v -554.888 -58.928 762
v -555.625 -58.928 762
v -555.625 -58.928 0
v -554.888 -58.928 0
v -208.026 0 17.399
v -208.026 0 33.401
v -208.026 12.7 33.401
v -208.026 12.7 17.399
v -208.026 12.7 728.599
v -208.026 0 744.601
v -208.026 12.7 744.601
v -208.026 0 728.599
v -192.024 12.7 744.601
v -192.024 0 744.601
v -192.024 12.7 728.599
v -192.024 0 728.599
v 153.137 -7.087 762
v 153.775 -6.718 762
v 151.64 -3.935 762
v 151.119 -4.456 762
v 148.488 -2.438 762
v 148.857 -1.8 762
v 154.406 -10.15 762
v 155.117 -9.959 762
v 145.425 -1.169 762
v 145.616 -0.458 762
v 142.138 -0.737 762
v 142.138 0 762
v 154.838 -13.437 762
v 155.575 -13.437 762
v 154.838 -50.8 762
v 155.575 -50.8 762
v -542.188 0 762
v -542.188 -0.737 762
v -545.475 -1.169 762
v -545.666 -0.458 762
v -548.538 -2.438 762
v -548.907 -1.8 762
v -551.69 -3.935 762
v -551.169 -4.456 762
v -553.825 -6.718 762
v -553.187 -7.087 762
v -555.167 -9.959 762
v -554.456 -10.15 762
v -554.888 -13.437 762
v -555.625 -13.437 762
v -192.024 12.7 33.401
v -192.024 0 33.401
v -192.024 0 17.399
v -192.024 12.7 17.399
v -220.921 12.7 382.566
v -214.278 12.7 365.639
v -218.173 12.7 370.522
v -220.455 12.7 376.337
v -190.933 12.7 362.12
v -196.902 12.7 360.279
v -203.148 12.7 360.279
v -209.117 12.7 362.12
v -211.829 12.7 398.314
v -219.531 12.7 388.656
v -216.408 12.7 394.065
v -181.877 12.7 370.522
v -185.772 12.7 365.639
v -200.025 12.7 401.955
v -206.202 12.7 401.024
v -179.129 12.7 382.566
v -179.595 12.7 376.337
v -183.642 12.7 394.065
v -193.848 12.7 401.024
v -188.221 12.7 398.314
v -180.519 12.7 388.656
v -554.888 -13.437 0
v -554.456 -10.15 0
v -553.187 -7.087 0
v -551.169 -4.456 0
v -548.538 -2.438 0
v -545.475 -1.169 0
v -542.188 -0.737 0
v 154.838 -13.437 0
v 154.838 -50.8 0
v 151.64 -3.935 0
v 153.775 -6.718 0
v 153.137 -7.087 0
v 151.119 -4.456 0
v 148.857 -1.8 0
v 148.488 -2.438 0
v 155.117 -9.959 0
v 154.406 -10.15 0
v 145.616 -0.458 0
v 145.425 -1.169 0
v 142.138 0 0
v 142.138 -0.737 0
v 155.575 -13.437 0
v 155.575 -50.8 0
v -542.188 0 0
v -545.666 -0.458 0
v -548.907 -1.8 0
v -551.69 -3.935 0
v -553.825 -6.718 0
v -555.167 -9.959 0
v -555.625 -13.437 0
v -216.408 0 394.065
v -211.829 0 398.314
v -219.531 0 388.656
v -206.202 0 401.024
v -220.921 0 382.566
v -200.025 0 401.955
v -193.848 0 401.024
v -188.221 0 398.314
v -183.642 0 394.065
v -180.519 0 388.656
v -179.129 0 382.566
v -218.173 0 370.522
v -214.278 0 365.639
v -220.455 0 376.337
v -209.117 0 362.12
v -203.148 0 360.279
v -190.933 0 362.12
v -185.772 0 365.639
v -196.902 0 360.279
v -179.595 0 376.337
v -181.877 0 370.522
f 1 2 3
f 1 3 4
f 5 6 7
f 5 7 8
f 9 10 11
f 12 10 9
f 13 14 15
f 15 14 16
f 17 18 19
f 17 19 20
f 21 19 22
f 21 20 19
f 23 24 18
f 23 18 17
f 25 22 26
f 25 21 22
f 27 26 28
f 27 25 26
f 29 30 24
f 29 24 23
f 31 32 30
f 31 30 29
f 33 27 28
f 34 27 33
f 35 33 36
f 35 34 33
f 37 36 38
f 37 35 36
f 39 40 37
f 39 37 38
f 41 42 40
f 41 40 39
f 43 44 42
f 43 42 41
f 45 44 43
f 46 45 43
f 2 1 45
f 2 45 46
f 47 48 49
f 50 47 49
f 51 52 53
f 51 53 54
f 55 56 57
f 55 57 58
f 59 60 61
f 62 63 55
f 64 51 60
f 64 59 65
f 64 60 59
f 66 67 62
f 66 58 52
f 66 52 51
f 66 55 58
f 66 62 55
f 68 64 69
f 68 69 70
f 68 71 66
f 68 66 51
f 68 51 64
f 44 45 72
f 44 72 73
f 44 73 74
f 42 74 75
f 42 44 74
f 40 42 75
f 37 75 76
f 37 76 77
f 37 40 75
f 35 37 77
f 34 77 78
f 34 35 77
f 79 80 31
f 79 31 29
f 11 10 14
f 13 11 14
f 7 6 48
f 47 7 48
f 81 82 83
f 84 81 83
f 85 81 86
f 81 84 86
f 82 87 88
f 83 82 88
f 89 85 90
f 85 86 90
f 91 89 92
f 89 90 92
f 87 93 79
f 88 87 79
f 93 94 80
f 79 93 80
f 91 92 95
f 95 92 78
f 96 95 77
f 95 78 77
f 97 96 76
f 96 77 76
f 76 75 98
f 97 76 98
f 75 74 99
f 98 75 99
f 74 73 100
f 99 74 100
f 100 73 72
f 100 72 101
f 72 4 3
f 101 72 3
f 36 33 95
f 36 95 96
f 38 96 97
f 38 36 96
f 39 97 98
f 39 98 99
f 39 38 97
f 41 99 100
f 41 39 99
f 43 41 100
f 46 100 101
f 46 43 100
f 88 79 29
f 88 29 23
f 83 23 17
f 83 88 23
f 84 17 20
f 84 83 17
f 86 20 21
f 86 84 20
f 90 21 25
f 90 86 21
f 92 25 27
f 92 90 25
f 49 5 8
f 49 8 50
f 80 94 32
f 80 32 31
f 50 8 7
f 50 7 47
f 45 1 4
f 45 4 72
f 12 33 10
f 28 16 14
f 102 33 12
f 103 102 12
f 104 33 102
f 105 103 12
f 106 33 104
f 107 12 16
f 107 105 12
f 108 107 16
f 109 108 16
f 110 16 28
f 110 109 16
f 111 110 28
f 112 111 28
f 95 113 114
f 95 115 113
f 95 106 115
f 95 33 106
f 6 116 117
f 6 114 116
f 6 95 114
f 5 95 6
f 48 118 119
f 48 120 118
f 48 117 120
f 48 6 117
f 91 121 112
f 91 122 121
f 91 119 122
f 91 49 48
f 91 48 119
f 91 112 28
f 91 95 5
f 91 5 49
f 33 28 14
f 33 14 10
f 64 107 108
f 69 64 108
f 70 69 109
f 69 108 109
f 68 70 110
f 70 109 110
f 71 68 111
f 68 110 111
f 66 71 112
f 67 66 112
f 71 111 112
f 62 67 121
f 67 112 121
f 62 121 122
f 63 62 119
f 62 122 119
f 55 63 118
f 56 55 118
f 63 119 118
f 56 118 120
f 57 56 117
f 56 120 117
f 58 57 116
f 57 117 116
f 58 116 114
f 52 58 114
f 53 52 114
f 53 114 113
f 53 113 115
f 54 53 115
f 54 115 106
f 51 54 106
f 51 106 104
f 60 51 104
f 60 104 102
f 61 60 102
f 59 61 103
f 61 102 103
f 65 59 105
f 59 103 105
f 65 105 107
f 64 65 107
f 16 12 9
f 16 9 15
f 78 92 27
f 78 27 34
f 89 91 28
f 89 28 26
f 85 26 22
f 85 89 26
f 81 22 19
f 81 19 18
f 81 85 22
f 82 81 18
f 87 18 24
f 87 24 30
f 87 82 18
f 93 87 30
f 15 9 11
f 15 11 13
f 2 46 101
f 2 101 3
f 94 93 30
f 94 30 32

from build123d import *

# Parameters (mm, degrees)
BASE_FLANGE1_DEPTH           = 762
EDGE_FLANGE1_STRIP_W         = 28.3464
EDGE_FLANGE1_STRIP_H         = 0.7366
EDGE_FLANGE1_STRIP_CUT_DEPTH = 762
EDGE_FLANGE1_DEPTH           = 762
SKETCH9_R                    = 20.955
SKETCH9_W                    = 16.002
SKETCH9_H                    = 16.002
BOSS_EXTRUDE2_DEPTH          = 12.7


# Sheet-metal steps are written as plain solids
with BuildPart() as part:
    # Sketch3 → Base-Flange1 (new body)
    with BuildSketch(Plane.XY):
        with BuildLine():
            Line((-555.625, 0), (142.1384, 0))
            ThreePointArc((142.1384, 0), (151.639510976, -3.935489024), (155.575, -13.4366))
            Line((155.575, -13.4366), (155.575, -50.8))
            Line((155.575, -50.8), (154.8384, -50.8))
            Line((154.8384, -50.8), (154.8384, -13.4366))
            ThreePointArc((154.8384, -13.4366), (151.118656121, -4.456343879), (142.1384, -0.7366))
            Line((142.1384, -0.7366), (-555.625, -0.7366))
            Line((-555.625, -0.7366), (-555.625, 0))
        make_face()
    extrude(amount=BASE_FLANGE1_DEPTH)

    # Edge-Flange1 strip (across the edge) → Edge-Flange1 strip cut (cut)
    with BuildSketch(Plane(origin=(-555.625, -0.7366, 762), x_dir=(1, 0, 0), z_dir=(0, 0, -1))):
        with Locations((-0.7366, -0.3683)):
            Rectangle(EDGE_FLANGE1_STRIP_W, EDGE_FLANGE1_STRIP_H)
    extrude(amount=EDGE_FLANGE1_STRIP_CUT_DEPTH, mode=Mode.SUBTRACT)

    # Edge-Flange1 section (across the edge) → Edge-Flange1 (add)
    with BuildSketch(Plane(origin=(-555.625, -0.7366, 762), x_dir=(1, 0, 0), z_dir=(0, 0, -1))):
        with BuildLine():
            Line((0, 12.7), (0, 58.1914))
            Line((0, 58.1914), (0.7366, 58.1914))
            Line((0.7366, 58.1914), (0.7366, 12.7))
            ThreePointArc((0.7366, 12.7), (4.456343879, 3.719743879), (13.4366, 0))
            Line((13.4366, 0), (13.4366, -0.7366))
            ThreePointArc((13.4366, -0.7366), (3.935489024, 3.198889024), (0, 12.7))
        make_face()
    extrude(amount=EDGE_FLANGE1_DEPTH)

    # Sketch9 → Boss-Extrude2 (add)
    with BuildSketch(Plane(origin=(0, 0, 0), x_dir=(1, 0, 0), z_dir=(0, 1, 0))):
        with Locations(Location((-200.025, -381, 0), (0, 0, 270))):
            Circle(SKETCH9_R)
        with Locations((-200.025, -736.6)):
            Rectangle(SKETCH9_W, SKETCH9_H)
        with Locations((-200.025, -25.4)):
            Rectangle(SKETCH9_W, SKETCH9_H)
    extrude(amount=BOSS_EXTRUDE2_DEPTH)


solid = part.part
